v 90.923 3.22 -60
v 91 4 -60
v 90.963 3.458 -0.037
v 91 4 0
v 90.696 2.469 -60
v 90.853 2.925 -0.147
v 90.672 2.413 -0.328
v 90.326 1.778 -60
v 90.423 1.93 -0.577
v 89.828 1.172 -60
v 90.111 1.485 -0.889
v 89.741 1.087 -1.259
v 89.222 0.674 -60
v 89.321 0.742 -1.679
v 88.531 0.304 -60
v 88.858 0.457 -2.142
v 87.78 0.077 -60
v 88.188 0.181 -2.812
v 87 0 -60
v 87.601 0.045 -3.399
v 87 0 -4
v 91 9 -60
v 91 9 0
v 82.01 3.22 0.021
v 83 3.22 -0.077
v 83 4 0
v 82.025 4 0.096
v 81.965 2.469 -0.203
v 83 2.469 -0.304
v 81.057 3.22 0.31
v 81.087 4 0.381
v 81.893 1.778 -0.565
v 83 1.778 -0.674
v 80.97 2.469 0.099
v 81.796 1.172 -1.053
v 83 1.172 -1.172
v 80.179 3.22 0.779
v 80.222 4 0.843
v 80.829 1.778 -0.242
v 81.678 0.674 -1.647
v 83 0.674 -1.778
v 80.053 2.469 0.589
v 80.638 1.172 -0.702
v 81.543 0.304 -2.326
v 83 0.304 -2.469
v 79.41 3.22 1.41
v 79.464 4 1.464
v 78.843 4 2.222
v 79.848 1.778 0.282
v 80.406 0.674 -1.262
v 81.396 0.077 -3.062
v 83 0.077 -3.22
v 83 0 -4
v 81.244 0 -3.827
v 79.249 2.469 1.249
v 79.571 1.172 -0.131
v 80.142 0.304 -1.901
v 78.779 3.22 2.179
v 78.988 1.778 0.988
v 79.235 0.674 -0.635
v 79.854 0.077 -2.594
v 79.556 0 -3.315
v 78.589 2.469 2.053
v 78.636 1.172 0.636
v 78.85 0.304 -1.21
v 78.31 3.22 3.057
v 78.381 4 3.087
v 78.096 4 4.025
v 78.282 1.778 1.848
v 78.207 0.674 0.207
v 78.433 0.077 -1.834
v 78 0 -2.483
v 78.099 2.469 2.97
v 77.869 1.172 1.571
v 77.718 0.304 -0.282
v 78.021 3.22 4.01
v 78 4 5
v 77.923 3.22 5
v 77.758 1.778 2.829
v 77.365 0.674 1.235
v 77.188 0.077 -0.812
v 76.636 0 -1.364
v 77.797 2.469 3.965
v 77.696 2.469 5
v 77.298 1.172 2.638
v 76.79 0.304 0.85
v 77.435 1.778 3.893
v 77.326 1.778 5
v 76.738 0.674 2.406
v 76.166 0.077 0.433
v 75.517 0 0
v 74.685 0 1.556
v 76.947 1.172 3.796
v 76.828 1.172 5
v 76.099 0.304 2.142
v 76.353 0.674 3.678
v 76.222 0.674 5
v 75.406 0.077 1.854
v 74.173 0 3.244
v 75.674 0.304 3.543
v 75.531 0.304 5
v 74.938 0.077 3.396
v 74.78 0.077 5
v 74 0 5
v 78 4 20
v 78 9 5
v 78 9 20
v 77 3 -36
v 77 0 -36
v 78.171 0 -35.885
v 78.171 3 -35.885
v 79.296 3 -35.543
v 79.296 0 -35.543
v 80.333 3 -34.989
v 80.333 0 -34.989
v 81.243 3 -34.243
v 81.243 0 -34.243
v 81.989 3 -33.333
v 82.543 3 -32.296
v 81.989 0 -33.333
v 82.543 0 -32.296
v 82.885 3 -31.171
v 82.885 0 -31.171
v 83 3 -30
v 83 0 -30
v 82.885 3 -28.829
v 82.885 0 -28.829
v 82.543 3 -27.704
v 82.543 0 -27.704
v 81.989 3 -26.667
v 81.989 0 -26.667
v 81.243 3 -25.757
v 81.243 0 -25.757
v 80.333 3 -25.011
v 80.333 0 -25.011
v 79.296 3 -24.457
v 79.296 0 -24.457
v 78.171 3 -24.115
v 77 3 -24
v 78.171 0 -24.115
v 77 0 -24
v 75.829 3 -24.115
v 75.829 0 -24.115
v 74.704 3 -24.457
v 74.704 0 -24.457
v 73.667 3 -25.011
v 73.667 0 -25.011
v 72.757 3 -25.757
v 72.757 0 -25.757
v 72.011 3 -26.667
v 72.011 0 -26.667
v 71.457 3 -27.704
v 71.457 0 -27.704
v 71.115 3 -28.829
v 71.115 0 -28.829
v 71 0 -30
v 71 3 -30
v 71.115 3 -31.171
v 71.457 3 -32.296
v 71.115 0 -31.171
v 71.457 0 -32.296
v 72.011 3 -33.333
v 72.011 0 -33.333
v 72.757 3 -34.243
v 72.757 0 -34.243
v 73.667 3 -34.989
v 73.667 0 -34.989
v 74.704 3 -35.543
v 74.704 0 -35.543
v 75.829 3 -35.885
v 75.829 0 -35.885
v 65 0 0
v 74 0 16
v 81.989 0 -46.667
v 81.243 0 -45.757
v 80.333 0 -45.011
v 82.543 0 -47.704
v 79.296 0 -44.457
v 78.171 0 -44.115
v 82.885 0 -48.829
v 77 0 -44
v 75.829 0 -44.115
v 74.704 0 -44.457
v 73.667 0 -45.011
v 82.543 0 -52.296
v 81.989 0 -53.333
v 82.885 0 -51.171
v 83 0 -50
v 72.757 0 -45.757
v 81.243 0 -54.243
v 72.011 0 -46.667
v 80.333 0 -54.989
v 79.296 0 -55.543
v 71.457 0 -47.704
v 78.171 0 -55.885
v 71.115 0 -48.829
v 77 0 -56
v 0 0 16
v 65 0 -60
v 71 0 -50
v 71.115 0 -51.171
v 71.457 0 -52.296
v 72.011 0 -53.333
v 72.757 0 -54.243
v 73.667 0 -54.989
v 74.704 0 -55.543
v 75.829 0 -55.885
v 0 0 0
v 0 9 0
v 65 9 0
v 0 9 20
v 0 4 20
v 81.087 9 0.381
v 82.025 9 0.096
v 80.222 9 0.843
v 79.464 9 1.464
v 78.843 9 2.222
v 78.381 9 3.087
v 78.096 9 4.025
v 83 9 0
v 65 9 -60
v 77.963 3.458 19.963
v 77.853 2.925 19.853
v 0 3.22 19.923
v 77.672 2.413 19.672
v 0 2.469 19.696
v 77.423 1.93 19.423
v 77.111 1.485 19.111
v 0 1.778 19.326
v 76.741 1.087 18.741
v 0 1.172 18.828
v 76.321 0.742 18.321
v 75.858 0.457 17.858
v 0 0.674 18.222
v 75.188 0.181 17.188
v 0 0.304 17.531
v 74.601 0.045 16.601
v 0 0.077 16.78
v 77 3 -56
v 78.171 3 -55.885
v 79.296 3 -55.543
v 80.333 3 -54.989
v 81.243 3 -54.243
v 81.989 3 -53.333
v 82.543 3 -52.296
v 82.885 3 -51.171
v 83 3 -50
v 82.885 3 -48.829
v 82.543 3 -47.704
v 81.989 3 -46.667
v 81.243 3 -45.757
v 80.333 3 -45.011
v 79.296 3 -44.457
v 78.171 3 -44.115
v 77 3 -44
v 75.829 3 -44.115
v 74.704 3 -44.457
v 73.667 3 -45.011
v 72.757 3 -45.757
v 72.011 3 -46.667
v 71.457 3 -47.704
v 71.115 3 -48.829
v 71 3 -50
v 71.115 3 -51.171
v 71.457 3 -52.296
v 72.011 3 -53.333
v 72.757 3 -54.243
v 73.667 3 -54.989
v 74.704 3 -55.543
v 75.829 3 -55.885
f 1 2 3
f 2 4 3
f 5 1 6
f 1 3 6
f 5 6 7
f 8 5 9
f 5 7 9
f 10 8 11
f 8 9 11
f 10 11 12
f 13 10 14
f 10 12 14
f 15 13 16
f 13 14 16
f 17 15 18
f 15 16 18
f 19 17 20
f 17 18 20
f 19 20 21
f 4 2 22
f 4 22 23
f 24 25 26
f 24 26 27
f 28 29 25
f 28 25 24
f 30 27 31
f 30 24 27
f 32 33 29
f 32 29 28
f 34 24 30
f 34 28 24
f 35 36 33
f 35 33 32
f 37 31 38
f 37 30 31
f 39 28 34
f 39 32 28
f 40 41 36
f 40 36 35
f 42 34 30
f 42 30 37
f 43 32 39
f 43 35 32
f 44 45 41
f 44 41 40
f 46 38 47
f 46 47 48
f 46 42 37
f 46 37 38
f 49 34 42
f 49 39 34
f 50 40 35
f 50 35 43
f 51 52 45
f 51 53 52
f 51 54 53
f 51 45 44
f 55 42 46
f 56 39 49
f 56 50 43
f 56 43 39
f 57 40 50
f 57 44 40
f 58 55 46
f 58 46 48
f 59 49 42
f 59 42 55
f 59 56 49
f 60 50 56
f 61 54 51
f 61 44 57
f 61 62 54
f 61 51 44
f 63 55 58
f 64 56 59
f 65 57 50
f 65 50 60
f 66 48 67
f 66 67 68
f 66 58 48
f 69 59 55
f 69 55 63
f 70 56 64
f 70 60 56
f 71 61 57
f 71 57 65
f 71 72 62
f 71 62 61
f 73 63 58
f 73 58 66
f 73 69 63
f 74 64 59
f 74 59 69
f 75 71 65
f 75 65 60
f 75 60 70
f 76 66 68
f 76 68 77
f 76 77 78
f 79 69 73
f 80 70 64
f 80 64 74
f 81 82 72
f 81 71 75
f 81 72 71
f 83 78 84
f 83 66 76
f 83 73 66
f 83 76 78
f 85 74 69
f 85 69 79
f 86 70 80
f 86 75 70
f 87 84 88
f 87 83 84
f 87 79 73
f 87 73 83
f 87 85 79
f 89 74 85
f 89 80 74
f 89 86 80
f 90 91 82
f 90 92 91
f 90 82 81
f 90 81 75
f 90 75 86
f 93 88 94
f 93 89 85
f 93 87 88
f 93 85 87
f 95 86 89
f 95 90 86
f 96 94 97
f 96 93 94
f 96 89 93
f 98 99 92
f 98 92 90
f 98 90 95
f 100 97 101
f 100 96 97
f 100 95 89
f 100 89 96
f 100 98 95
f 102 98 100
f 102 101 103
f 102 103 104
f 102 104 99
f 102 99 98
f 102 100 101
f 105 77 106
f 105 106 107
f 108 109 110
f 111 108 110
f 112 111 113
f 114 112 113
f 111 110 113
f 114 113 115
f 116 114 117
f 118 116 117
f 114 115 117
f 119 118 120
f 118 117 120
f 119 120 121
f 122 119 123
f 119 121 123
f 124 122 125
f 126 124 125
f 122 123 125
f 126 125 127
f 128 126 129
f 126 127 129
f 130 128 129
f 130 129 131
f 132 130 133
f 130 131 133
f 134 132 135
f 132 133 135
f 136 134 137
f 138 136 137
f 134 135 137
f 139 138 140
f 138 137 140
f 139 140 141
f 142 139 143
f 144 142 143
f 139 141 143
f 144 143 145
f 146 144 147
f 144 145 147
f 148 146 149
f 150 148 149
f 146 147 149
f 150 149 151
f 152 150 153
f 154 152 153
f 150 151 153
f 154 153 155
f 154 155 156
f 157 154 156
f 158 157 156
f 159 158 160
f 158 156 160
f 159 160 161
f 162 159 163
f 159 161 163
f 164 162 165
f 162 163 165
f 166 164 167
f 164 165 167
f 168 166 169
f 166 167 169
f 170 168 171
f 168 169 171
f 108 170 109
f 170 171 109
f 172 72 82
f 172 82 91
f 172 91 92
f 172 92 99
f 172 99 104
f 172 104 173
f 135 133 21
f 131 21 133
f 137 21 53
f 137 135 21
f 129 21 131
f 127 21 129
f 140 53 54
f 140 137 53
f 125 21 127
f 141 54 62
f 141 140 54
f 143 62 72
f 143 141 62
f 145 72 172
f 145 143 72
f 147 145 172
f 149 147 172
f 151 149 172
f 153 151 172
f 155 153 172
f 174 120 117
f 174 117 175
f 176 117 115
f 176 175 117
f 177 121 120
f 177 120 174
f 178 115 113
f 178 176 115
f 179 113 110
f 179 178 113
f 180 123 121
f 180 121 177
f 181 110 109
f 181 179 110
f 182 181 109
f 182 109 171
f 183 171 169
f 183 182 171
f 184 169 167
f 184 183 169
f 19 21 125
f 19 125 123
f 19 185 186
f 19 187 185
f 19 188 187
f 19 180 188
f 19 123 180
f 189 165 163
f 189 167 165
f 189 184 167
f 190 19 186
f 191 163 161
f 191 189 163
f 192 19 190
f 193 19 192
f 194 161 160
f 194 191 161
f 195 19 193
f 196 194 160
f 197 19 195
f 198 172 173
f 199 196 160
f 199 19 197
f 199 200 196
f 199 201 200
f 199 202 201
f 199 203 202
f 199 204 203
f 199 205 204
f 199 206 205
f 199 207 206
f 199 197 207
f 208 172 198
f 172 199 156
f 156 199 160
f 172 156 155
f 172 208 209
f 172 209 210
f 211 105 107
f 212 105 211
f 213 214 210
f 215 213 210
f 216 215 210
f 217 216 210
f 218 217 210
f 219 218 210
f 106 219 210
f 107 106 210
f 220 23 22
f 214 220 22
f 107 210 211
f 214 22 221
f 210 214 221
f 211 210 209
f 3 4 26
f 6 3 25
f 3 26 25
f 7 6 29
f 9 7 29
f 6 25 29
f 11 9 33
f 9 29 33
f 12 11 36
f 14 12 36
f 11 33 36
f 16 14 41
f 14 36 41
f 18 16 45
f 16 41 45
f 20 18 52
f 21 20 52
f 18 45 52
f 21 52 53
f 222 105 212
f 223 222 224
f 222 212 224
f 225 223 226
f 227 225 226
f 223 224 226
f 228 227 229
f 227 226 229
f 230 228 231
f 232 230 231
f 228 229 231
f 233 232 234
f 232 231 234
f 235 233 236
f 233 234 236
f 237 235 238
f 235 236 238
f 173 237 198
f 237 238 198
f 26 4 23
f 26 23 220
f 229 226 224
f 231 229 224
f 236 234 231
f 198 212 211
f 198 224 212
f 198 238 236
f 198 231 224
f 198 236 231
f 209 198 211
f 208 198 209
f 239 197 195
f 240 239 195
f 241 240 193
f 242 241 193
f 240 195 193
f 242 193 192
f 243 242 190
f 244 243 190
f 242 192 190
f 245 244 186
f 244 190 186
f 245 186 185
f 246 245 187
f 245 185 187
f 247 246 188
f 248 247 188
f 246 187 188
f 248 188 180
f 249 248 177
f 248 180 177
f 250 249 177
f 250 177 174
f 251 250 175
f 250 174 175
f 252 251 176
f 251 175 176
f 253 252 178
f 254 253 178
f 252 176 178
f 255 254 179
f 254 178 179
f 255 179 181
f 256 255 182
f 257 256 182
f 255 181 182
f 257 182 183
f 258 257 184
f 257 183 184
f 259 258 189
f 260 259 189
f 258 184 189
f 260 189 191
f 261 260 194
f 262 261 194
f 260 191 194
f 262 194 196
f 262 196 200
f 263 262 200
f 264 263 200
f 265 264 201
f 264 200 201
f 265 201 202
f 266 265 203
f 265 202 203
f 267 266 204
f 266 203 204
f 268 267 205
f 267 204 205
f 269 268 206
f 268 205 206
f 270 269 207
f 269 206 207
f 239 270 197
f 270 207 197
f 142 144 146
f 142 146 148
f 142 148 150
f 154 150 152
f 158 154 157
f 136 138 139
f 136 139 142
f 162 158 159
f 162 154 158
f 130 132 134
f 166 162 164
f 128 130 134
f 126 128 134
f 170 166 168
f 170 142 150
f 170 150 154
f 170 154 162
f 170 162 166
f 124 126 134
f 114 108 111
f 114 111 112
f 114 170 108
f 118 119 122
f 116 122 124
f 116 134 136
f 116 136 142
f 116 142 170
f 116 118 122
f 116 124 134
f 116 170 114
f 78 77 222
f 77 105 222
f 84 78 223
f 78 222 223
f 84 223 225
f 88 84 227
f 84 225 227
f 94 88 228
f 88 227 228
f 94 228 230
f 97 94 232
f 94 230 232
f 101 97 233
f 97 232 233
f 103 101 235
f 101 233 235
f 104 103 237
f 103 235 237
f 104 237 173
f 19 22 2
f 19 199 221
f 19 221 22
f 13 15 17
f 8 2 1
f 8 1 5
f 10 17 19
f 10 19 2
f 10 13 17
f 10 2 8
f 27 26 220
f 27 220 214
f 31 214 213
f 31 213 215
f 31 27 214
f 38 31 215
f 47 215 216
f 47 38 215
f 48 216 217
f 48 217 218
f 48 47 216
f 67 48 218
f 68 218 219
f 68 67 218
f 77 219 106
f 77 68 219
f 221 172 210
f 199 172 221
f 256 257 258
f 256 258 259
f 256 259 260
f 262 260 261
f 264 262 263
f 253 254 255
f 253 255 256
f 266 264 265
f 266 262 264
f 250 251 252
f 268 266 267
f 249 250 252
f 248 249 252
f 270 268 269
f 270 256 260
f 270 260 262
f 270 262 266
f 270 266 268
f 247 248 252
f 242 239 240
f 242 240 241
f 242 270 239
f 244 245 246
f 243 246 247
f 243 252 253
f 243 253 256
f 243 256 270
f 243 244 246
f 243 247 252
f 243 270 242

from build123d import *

# Parameters (mm, degrees)
EXTRUDE_1_DEPTH     = 9
FILLET_1_R          = 4
SKETCH_2_R          = 6
CUT_EXTRUDE_1_DEPTH = 3


with BuildPart() as part:
    # 草圖1 → 填料-伸長1 (new body)
    with BuildSketch(Plane(origin=(0, 0, 0), x_dir=(1, 0, 0), z_dir=(0, 1, 0))):
        with BuildLine():
            Line((0, 0), (65, 0))
            Line((65, 0), (65, 60))
            Line((65, 60), (91, 60))
            Line((91, 60), (91, 0))
            Line((91, 0), (83, 0))
            ThreePointArc((83, 0), (79.464466094, -1.464466094), (78, -5))
            Line((78, -5), (78, -20))
            Line((78, -20), (0, -20))
            Line((0, -20), (0, 0))
        make_face()
    extrude(amount=EXTRUDE_1_DEPTH)

    # 圓角1
    fillet_1_edges = [part.edges().sort_by_distance(p)[0] for p in [
        (87, 0, 0),
        (79.464466094, 0, 1.464466094),
        (78, 0, 12.5),
        (39, 0, 20),
        (91, 0, -30),
    ]]
    fillet(fillet_1_edges, radius=FILLET_1_R)

    # 草圖2 → 除料-伸長1 (cut)
    with BuildSketch(Plane.XZ):
        with Locations(Location((77, -50, 0), (0, 0, 270))):
            Circle(SKETCH_2_R)
        with Locations(Location((77, -30, 0), (0, 0, 270))):
            Circle(SKETCH_2_R)
    extrude(amount=-CUT_EXTRUDE_1_DEPTH, mode=Mode.SUBTRACT)


solid = part.part
